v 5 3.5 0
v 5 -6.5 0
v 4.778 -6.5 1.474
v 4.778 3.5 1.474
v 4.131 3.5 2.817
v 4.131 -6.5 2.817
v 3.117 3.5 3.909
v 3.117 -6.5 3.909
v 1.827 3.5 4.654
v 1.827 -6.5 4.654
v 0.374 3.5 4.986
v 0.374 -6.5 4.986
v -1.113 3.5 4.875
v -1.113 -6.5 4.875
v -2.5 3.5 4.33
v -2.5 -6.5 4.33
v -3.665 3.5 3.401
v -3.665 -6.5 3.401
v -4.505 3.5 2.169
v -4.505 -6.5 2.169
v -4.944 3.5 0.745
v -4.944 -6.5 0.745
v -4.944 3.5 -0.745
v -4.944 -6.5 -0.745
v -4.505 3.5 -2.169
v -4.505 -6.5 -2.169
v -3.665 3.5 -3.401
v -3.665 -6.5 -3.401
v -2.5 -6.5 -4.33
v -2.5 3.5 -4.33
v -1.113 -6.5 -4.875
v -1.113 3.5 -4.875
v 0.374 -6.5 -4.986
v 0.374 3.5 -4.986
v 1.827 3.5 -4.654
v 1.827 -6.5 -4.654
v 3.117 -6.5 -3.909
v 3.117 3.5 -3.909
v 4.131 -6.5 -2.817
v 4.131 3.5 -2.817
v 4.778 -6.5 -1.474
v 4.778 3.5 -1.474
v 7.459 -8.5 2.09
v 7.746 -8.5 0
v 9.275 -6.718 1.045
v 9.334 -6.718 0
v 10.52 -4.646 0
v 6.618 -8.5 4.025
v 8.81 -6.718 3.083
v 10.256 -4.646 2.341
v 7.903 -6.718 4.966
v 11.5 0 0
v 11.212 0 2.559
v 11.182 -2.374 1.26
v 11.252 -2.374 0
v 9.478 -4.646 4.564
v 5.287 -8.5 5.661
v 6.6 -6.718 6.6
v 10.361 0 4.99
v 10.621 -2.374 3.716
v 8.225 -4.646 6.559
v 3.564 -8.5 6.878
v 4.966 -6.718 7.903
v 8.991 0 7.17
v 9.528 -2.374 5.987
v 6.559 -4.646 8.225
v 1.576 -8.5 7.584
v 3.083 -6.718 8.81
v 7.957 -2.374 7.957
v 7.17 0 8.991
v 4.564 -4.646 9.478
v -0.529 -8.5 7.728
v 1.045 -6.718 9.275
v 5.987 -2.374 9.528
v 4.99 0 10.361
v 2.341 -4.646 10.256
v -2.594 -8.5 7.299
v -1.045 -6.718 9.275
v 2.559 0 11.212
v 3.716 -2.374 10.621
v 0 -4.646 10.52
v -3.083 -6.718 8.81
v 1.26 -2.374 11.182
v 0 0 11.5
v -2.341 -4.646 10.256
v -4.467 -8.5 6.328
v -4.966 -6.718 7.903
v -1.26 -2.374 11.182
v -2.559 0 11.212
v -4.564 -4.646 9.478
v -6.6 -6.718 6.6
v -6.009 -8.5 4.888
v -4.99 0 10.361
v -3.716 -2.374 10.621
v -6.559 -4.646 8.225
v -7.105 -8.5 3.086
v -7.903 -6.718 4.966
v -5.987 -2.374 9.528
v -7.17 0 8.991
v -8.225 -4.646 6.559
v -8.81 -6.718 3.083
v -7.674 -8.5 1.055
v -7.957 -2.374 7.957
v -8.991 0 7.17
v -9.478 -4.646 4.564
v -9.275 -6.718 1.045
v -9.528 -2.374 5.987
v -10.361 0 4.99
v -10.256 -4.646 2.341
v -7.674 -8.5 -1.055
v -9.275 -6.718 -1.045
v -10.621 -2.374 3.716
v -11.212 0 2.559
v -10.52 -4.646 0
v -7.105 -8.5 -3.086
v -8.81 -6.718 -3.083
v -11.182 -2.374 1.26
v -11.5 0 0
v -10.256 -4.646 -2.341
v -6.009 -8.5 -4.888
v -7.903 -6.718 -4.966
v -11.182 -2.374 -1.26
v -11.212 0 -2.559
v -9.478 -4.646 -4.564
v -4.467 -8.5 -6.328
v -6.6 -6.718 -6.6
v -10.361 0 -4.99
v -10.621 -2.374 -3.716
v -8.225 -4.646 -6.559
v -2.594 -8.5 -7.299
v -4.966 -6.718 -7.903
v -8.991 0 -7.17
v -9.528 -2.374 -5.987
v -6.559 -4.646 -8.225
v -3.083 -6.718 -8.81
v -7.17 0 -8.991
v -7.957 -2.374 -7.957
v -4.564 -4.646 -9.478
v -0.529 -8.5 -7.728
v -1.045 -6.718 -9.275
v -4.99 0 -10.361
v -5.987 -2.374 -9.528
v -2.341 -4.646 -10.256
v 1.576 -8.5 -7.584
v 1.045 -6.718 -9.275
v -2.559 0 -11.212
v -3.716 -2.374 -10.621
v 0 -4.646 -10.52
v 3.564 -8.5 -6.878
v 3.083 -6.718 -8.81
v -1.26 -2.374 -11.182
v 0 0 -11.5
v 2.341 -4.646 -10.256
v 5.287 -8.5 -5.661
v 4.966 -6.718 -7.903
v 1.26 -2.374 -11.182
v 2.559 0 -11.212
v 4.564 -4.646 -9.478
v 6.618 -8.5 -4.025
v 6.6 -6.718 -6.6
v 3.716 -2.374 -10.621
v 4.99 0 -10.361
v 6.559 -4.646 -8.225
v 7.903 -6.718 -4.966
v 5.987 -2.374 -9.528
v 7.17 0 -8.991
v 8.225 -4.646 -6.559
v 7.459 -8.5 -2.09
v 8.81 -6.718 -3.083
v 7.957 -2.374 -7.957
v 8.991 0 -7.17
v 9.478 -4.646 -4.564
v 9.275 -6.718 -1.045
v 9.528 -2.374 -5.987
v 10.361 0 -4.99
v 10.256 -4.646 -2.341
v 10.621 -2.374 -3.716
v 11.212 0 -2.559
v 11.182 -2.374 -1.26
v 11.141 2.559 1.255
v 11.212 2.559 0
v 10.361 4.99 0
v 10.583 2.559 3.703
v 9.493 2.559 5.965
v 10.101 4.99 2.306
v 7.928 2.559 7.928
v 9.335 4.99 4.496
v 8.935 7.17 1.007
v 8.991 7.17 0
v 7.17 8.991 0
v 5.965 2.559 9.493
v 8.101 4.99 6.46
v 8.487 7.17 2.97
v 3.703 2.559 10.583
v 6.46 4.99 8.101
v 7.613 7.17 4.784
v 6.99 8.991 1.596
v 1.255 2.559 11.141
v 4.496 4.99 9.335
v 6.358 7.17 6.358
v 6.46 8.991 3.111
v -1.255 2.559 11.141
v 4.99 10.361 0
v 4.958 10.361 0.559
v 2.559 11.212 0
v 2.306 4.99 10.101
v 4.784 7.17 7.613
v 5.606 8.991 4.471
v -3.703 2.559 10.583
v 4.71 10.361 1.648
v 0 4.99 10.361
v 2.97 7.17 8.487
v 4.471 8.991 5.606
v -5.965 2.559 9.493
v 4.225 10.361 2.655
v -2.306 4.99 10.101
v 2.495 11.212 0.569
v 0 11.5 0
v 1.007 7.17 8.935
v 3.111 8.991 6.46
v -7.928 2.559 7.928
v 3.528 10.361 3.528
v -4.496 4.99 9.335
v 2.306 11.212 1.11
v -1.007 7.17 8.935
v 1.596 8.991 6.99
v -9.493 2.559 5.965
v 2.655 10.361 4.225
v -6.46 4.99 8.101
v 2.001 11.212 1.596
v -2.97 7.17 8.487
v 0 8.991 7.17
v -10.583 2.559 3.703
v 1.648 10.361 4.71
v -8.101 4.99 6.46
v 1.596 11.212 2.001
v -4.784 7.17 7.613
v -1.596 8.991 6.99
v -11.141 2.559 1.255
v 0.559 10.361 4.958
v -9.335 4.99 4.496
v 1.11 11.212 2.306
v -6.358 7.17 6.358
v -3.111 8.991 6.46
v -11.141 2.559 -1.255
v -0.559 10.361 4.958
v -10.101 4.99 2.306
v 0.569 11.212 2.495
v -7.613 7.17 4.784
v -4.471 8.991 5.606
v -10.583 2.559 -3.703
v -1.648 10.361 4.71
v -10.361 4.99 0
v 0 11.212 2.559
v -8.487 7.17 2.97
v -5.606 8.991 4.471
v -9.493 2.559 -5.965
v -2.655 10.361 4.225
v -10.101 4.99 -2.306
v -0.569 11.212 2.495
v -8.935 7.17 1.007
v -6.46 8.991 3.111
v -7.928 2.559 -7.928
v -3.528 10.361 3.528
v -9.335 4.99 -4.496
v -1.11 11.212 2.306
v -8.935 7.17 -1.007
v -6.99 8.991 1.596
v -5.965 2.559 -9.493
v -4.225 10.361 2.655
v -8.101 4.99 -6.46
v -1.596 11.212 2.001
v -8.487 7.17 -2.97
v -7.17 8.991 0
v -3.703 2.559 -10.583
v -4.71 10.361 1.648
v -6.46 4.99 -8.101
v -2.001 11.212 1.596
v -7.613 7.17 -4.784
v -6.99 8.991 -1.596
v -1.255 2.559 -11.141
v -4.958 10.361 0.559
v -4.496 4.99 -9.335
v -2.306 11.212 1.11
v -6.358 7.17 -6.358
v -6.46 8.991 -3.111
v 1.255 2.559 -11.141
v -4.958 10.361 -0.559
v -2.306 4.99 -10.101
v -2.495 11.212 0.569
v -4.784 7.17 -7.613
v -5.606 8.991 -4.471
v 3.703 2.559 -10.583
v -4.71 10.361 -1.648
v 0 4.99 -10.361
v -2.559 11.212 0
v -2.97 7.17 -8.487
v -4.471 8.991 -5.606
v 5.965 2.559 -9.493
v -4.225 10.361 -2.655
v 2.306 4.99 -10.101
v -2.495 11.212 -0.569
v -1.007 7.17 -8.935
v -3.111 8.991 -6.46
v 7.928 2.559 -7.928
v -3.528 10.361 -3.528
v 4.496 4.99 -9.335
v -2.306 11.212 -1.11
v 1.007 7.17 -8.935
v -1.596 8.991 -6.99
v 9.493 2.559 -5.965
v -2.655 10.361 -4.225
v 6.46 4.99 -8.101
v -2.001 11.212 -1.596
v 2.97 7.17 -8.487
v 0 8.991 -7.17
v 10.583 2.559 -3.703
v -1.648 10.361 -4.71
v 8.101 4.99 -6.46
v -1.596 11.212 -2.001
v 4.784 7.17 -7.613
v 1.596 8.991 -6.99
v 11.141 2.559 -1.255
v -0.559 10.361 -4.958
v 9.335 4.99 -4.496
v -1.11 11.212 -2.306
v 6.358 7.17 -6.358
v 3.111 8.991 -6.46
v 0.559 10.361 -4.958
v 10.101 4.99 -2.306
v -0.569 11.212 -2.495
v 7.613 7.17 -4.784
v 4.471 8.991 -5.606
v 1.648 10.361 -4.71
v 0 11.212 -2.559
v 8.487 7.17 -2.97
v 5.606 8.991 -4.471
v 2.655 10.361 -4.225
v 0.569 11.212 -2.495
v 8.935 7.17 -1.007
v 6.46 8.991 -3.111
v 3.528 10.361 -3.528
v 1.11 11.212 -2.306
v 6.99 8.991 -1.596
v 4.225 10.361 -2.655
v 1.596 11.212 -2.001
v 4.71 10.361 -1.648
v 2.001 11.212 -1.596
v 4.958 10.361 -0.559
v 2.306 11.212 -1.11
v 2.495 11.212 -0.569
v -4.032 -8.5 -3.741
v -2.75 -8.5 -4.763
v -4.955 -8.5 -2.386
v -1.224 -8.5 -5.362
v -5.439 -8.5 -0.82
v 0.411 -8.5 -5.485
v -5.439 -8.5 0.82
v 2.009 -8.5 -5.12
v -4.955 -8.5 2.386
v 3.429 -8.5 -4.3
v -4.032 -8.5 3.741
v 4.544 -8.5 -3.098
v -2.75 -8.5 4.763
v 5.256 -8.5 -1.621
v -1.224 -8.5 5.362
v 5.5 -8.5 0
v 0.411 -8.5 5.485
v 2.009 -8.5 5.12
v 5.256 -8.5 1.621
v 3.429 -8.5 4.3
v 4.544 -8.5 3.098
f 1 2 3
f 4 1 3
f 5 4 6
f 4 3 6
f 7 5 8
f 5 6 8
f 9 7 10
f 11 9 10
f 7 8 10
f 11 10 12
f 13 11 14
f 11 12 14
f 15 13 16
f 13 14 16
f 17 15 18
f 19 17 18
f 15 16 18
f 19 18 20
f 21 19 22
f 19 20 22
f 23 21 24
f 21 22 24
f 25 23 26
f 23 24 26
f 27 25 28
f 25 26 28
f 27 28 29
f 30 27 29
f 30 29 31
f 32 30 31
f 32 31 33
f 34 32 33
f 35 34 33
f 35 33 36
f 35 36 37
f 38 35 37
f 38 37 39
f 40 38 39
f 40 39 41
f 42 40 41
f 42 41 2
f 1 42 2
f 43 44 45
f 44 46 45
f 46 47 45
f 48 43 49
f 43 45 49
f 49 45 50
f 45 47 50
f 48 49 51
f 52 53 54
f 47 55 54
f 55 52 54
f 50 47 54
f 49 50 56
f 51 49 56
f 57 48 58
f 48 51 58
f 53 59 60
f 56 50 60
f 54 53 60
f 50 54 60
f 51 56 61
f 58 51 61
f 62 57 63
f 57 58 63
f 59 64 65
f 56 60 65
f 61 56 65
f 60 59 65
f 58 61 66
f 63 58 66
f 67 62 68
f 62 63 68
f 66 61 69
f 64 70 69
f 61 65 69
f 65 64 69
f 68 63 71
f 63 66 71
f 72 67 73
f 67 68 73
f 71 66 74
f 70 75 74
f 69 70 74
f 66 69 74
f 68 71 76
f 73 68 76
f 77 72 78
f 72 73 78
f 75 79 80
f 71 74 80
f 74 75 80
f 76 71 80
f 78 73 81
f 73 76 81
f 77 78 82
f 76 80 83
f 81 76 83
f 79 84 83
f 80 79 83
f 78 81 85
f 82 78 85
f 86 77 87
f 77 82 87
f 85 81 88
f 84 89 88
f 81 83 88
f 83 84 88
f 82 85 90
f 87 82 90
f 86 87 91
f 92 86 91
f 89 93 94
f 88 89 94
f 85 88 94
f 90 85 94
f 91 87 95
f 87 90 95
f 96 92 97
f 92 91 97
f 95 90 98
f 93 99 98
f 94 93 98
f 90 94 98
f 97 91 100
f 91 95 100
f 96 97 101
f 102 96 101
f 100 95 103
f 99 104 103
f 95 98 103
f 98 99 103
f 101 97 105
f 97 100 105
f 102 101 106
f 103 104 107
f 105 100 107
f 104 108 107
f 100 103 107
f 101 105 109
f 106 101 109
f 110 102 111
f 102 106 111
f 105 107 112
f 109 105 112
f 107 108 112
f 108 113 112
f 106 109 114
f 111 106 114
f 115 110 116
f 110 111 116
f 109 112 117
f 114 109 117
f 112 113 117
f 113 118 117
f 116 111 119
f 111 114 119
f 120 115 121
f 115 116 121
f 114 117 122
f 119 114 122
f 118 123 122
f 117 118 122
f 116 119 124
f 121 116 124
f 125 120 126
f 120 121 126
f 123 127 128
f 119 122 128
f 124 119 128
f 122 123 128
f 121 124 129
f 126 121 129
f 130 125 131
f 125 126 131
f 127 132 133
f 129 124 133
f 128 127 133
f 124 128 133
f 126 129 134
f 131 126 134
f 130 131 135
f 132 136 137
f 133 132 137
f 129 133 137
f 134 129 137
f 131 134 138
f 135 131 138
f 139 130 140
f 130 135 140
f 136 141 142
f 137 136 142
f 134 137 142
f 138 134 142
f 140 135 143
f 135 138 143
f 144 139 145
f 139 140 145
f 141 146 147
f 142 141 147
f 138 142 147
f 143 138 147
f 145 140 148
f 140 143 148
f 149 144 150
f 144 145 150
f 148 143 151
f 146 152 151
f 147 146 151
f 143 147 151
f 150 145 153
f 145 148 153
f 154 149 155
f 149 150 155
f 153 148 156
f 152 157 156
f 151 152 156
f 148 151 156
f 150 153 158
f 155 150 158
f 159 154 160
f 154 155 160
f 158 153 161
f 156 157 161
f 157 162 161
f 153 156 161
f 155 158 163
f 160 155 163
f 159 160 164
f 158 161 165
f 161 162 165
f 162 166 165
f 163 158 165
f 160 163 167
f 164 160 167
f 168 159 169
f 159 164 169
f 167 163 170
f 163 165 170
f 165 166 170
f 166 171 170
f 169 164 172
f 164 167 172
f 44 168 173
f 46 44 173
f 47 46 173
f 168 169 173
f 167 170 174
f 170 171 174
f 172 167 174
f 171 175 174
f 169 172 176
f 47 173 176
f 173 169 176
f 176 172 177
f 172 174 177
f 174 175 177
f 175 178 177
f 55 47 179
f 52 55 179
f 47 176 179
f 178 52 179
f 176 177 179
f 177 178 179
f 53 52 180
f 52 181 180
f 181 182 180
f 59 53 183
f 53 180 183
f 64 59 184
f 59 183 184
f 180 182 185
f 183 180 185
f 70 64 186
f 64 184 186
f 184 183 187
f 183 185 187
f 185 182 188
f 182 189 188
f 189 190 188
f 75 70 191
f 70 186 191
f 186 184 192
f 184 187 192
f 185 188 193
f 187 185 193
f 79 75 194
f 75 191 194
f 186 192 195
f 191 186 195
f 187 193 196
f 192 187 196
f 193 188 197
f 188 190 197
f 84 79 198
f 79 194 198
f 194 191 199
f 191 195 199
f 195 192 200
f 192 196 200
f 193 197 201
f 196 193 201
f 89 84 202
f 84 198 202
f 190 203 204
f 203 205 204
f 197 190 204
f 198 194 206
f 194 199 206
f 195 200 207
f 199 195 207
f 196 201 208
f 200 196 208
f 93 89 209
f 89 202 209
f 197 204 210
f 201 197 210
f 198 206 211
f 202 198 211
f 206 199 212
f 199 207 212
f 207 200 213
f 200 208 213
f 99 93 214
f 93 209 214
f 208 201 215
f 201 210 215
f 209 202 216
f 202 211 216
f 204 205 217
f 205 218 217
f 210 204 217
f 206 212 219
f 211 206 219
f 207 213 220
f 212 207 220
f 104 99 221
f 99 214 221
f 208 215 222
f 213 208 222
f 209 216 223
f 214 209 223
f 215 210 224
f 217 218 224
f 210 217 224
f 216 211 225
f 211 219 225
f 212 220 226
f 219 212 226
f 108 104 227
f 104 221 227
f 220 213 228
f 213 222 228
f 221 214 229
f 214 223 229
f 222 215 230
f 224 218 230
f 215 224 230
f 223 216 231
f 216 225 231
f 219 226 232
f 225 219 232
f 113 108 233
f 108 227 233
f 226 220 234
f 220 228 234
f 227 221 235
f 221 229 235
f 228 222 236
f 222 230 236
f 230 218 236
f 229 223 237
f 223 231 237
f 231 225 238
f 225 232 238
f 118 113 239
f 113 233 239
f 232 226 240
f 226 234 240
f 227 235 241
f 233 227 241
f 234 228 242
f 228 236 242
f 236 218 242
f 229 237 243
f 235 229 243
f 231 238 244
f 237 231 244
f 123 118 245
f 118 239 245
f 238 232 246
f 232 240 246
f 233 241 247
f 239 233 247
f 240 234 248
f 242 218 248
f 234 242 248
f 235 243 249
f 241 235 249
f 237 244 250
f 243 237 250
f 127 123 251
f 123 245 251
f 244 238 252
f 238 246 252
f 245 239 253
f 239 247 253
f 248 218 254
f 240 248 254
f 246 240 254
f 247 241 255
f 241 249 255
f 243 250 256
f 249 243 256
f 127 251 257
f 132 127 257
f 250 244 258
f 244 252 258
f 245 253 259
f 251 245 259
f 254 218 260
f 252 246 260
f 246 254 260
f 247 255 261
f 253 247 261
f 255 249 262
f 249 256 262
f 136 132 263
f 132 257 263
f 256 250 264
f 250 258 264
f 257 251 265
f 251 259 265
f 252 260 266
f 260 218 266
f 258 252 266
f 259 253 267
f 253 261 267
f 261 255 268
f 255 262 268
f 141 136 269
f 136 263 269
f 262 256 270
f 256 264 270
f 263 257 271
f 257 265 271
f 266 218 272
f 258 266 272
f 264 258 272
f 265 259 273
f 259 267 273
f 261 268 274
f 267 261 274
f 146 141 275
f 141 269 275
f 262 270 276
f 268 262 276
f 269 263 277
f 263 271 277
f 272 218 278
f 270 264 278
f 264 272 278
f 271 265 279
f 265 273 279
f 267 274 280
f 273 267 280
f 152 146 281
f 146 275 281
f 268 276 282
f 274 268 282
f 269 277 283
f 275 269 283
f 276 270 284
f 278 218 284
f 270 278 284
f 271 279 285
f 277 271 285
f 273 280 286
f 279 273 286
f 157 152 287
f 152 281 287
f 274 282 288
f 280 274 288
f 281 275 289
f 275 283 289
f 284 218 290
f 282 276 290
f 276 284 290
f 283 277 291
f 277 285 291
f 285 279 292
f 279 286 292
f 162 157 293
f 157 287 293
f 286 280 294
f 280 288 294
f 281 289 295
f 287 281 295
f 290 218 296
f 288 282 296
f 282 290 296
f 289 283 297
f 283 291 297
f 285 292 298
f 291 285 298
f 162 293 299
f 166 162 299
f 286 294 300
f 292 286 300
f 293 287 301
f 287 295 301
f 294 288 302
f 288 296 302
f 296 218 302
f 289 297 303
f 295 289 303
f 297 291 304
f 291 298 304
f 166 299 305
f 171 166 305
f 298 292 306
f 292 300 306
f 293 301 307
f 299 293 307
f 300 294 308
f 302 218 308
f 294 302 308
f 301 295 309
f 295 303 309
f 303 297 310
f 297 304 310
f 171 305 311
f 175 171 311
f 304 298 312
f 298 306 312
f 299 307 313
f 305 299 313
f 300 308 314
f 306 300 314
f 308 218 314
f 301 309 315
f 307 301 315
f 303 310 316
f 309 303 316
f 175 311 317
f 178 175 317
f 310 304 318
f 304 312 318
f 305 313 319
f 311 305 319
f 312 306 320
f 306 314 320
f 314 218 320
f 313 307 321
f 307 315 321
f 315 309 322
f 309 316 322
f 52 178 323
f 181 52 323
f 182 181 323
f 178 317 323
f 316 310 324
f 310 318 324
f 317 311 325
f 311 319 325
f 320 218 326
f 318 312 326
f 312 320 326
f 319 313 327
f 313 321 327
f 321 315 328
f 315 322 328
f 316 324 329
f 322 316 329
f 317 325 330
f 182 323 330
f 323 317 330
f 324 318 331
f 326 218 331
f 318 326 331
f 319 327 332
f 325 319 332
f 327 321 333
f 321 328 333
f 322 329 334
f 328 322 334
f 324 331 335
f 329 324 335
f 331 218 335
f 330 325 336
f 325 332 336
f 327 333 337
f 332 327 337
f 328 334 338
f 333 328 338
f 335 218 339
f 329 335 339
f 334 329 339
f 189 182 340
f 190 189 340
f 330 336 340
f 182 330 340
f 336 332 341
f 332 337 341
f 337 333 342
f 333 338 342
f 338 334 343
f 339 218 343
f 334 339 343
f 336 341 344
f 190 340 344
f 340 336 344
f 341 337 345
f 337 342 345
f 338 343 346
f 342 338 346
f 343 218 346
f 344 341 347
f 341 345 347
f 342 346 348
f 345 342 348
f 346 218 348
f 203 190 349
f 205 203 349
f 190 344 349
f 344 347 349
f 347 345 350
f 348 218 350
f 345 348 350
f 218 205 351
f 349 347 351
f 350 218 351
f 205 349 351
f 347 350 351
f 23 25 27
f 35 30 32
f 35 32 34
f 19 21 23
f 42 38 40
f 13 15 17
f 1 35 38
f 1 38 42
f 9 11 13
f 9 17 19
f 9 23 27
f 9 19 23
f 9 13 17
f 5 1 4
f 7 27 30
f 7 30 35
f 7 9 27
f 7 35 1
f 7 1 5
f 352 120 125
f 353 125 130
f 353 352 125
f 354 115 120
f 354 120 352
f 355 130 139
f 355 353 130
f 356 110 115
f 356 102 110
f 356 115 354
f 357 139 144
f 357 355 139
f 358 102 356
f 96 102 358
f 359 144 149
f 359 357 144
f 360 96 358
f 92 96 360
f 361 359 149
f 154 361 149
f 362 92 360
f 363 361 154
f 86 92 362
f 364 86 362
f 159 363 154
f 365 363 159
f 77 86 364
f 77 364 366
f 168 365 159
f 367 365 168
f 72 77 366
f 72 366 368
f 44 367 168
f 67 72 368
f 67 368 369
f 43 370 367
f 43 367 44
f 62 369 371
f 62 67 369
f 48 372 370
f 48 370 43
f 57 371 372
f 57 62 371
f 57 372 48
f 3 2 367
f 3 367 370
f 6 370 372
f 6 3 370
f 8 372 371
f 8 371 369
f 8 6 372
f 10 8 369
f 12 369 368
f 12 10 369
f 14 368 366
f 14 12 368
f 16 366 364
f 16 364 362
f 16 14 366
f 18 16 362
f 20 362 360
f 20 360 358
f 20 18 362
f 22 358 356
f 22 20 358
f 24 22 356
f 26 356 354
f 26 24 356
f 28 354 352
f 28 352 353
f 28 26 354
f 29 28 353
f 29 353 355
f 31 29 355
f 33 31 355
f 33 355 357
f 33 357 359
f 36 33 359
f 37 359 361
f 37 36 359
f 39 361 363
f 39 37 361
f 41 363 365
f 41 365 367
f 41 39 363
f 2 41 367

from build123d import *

# Parameters (mm, degrees)
F3_R     = 5
F4_DEPTH = 15
F5_R     = 8.305738
F6_DEPTH = 3
F7_SIZE2 = 2
F7_SIZE  = 0.5


with BuildPart() as f1:
    # F0 (on Top) → F1 (revolve)
    with BuildSketch(Plane.XY):
        with BuildLine():
            ThreePointArc((0, -11.5), (8.131728, -8.131728), (11.5, 0))
            ThreePointArc((11.5, 0), (8.131728, 8.131728), (0, 11.5))
            Line((0, 11.5), (0, -11.5))
        make_face()
    revolve(axis=Axis((0, -5.406174, 0), (0, -1, 0)))

    # F3 (on face) → F4 (cut)
    with BuildSketch(Plane.XZ.offset(11.5)):
        Circle(F3_R)
    extrude(amount=-F4_DEPTH, mode=Mode.SUBTRACT)

    # F5 (on face) → F6 (cut)
    with BuildSketch(Plane.XZ.offset(11.5)):
        Circle(F5_R)
    extrude(amount=-F6_DEPTH, mode=Mode.SUBTRACT)

    # F7
    f7_edges = [f1.edges().sort_by_distance(p)[0] for p in [
        (-5, -8.5, 0),
    ]]
    chamfer(f7_edges, length=F7_SIZE, length2=F7_SIZE2)


solid = f1.part
